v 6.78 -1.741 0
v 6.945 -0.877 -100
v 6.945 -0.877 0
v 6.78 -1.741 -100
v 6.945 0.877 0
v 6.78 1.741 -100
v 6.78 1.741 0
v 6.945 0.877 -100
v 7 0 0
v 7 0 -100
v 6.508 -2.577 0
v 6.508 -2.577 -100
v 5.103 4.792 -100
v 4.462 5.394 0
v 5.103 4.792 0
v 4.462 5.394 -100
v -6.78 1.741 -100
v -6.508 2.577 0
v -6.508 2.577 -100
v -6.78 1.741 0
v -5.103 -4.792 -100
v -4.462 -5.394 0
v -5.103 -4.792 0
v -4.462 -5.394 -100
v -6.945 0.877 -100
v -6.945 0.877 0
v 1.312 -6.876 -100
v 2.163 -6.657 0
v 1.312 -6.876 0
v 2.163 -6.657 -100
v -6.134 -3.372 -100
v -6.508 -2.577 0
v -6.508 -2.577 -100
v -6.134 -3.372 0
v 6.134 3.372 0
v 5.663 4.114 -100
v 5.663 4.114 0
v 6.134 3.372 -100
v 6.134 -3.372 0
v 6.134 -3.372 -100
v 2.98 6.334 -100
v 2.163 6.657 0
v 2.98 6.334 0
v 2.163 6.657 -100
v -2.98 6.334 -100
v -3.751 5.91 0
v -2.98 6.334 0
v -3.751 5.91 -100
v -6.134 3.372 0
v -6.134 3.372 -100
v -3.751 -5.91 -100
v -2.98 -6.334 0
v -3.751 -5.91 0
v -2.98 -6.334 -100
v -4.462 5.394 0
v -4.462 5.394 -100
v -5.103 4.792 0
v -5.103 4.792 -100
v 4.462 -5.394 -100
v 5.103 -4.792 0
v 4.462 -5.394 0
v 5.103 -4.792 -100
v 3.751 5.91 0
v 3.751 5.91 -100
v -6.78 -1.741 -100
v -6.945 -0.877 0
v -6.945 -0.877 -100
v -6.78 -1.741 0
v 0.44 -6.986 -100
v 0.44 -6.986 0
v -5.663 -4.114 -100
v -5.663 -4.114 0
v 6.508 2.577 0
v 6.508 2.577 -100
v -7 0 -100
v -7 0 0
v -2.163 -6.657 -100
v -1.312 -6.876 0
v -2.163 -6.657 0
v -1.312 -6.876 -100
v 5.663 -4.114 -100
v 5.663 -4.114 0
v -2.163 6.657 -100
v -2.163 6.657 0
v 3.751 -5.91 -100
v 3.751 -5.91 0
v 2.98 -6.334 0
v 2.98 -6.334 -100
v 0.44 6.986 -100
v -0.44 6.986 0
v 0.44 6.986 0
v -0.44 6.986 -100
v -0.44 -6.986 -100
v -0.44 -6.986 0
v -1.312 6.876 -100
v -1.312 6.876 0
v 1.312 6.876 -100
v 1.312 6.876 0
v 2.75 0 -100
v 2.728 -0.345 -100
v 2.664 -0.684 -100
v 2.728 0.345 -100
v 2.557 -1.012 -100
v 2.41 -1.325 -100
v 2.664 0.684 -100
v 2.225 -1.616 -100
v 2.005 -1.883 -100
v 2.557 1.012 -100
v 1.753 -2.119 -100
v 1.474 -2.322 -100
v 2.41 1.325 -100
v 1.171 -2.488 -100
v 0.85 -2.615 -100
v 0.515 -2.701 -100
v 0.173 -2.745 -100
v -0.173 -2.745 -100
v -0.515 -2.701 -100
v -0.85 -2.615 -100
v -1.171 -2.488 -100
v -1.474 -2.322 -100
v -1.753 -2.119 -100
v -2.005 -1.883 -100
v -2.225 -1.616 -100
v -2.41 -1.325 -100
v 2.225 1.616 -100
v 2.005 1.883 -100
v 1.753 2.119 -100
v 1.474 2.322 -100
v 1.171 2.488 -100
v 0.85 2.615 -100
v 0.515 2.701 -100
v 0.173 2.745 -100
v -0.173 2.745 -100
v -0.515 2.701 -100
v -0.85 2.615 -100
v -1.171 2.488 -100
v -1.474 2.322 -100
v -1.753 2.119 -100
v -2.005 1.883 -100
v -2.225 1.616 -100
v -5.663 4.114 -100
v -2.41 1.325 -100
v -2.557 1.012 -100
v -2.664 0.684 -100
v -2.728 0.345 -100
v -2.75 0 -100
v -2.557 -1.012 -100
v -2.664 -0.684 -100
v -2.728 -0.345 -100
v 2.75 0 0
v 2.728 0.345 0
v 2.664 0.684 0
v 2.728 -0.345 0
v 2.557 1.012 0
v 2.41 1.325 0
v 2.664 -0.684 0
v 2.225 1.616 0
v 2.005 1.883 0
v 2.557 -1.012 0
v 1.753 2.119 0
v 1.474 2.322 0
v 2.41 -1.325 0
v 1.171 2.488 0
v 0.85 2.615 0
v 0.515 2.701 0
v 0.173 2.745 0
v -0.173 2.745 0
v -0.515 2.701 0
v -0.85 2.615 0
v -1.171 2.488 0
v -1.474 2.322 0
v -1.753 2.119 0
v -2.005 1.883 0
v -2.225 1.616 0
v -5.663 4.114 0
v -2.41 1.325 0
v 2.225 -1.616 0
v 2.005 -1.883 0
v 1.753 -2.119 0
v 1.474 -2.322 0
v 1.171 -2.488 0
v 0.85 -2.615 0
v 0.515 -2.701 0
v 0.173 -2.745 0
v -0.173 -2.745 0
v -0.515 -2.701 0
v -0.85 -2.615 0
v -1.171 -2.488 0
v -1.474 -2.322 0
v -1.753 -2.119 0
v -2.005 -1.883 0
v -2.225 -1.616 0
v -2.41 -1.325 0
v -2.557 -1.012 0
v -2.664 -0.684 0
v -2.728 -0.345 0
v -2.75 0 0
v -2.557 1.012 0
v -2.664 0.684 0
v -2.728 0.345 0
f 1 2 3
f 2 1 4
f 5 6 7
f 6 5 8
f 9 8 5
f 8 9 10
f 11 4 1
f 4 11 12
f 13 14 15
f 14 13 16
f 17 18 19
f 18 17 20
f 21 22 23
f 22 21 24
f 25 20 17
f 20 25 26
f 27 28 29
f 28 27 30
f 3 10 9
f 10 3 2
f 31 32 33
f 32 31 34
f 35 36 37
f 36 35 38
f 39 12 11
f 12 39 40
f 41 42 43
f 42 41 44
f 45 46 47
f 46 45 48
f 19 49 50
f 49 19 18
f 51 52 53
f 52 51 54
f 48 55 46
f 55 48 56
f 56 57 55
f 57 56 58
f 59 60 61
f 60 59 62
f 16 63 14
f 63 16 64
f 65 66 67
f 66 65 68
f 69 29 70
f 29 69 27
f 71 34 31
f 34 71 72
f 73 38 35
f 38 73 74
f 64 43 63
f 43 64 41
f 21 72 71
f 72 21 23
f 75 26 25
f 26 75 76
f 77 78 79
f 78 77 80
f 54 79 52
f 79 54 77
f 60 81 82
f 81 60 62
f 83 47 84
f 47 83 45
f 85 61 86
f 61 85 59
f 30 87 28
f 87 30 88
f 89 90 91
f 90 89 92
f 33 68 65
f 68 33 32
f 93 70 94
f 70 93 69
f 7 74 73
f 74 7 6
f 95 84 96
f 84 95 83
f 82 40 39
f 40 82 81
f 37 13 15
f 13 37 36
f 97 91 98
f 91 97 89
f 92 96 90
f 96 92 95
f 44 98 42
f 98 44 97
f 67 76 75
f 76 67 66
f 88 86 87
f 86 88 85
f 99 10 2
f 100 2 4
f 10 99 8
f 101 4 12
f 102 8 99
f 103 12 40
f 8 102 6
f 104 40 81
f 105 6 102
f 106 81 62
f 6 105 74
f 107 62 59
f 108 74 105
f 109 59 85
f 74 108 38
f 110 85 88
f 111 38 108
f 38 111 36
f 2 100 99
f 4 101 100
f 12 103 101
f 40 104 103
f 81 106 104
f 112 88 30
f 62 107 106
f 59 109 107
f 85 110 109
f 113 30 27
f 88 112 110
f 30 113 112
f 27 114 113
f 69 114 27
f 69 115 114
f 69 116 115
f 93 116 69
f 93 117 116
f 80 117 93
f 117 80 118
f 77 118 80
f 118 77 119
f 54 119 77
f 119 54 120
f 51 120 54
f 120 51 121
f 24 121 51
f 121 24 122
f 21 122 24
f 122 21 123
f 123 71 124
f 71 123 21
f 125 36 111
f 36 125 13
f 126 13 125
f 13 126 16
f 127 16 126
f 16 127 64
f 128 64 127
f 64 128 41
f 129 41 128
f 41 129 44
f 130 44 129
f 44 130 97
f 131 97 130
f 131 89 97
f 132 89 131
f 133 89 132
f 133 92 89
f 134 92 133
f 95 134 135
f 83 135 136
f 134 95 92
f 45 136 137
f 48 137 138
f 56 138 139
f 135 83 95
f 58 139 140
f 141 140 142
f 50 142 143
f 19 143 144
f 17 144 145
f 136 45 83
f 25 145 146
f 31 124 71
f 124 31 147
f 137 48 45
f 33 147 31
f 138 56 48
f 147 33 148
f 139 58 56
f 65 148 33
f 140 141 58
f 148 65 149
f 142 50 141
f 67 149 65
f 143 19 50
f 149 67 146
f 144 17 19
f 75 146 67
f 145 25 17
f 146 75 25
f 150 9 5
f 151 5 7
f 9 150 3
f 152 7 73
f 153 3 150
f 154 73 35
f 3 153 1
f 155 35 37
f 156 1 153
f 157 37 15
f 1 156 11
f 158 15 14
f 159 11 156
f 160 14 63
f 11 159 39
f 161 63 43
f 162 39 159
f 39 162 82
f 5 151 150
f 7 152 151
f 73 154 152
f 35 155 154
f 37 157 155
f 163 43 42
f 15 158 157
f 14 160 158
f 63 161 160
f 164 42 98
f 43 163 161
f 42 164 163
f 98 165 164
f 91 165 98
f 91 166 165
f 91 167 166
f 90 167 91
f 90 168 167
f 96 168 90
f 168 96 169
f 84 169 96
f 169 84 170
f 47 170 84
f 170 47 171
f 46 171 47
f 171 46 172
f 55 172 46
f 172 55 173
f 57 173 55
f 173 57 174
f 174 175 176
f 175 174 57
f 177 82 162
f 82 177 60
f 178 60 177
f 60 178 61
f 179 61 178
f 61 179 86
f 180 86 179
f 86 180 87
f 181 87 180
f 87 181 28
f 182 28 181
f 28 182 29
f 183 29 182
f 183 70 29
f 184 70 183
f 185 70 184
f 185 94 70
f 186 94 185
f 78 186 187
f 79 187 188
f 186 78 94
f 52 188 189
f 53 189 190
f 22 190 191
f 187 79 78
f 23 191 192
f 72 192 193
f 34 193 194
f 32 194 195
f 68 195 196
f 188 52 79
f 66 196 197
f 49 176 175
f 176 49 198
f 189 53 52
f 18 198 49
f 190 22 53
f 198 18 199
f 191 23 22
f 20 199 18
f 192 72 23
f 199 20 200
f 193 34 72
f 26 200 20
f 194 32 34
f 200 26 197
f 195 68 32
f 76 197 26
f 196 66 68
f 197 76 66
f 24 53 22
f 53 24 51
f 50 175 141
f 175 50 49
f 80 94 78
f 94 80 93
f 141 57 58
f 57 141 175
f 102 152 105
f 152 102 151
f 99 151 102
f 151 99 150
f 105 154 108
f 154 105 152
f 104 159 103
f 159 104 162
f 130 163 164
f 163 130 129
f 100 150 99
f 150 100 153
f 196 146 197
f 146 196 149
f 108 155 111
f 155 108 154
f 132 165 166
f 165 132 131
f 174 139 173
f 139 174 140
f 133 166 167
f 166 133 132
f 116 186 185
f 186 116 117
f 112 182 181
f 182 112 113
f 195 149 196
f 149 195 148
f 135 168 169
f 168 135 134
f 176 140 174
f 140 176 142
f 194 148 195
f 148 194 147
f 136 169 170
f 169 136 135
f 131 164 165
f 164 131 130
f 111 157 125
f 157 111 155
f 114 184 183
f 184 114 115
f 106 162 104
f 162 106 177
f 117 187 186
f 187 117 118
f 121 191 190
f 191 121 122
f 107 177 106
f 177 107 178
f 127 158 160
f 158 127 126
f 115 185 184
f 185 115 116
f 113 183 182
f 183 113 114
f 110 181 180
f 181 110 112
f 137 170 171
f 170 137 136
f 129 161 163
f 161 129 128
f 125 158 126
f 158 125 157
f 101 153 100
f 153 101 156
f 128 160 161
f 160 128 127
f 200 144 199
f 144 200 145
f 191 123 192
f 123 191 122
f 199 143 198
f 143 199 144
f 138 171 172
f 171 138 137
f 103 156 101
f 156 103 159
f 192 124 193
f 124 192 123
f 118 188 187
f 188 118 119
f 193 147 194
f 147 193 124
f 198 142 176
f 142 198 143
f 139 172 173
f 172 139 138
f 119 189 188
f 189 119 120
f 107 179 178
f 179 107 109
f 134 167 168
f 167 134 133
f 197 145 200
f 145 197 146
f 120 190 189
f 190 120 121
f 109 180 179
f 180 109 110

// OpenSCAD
$fn = 50;


difference() {
	union() {
		translate(v = [0, 0, -100.0000000000]) {
			cylinder(h = 100, r = 7.0000000000);
		}
		cylinder(h = 0, r = 10.0000000000);
	}
	union() {
		#translate(v = [0, 0, -100]) {
			cylinder(h = 100, r = 2.7500000000);
		}
	}
}
